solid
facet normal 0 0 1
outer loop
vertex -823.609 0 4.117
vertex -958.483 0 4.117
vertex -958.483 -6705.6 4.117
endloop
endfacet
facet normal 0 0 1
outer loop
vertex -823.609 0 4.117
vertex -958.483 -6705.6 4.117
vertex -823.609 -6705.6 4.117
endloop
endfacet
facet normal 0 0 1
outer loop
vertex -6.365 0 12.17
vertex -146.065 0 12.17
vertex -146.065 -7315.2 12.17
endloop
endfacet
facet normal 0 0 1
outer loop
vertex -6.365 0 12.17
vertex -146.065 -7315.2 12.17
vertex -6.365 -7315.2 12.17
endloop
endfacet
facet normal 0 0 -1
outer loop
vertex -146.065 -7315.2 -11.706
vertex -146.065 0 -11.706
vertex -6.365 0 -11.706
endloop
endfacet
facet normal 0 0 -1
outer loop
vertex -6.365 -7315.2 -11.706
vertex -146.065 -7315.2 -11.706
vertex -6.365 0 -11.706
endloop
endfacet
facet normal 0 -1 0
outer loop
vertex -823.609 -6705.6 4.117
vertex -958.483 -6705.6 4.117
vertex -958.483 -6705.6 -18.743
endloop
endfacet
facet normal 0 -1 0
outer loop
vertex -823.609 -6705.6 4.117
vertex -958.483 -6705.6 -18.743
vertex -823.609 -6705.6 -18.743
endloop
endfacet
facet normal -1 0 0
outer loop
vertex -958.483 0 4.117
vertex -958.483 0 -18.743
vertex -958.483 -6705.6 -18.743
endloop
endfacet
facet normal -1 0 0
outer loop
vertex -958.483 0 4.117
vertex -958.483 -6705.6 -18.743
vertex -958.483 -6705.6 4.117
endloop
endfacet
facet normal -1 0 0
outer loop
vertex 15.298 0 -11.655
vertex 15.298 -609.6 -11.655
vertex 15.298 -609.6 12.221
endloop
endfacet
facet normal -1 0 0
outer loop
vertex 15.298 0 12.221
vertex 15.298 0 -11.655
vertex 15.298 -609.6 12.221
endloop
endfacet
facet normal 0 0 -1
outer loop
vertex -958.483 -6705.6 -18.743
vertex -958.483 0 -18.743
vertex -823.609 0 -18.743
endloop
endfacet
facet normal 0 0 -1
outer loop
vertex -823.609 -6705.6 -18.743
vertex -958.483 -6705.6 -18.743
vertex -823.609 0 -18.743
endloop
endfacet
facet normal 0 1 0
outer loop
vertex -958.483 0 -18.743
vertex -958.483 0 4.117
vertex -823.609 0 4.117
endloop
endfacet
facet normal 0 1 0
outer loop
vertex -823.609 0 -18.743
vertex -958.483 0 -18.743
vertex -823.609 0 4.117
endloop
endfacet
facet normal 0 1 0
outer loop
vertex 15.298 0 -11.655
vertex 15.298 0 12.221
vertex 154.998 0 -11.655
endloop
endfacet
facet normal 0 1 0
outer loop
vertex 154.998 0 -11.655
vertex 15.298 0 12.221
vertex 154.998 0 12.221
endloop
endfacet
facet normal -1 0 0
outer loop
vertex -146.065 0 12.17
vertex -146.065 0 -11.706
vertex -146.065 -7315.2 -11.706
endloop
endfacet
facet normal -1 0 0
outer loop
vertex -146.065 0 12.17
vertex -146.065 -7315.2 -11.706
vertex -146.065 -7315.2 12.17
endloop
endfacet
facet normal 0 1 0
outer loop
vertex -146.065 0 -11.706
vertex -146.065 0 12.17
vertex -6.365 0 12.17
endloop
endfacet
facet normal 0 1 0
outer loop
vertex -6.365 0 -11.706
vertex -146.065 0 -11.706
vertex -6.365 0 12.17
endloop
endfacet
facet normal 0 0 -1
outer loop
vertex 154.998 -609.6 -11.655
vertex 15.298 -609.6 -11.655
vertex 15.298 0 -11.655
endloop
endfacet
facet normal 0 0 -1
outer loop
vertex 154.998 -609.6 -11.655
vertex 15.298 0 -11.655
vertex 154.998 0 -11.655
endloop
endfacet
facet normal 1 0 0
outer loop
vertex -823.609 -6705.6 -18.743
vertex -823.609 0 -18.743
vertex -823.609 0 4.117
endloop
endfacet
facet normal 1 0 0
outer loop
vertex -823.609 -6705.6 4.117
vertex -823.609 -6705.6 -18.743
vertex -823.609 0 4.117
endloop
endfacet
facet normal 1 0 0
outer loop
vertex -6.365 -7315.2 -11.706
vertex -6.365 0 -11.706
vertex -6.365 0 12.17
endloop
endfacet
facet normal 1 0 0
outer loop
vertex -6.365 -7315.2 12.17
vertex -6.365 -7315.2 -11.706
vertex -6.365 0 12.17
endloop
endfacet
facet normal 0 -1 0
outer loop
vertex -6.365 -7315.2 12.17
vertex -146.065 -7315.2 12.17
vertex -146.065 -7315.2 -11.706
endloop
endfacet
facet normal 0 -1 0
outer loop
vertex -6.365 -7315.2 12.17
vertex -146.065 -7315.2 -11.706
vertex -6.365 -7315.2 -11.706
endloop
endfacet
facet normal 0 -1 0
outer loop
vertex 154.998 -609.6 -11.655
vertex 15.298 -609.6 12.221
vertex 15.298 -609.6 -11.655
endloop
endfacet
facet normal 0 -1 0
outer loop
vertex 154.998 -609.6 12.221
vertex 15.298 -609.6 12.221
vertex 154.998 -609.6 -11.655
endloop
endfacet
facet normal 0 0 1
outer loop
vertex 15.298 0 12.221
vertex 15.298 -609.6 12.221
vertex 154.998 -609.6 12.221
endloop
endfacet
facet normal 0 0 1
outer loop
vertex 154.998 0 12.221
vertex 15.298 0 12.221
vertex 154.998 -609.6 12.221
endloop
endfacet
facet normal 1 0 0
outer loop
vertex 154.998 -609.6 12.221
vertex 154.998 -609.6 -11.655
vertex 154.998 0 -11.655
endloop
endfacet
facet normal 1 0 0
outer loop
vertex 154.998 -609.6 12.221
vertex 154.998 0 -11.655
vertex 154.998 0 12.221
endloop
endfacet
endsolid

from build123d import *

# Parameters (mm, degrees)
F1_W     = 134.874
F1_H     = 22.86
F2_DEPTH = 6705.6
F0_W     = 139.7
F0_H     = 23.876
F3_DEPTH = 7315.2
F4_DEPTH = 609.6


with BuildPart() as f2:
    # F1 (on Front) → F2 (new body)
    with BuildSketch(Plane.XZ):
        with Locations((-891.046339, -7.312742)):
            Rectangle(F1_W, F1_H)
    extrude(amount=F2_DEPTH)


with BuildPart() as f3:
    # F0 (on Front) → F3 (new body)
    with BuildSketch(Plane.XZ):
        with Locations((-76.214892, 0.231927)):
            Rectangle(F0_W, F0_H)
    extrude(amount=F3_DEPTH)


with BuildPart() as f4:
    # F0 (on Front) → F4 (new body)
    with BuildSketch(Plane.XZ):
        with Locations((85.147511, 0.282716)):
            Rectangle(F0_W, F0_H)
    extrude(amount=F4_DEPTH)


solid = Compound([f2.part, f3.part, f4.part])
